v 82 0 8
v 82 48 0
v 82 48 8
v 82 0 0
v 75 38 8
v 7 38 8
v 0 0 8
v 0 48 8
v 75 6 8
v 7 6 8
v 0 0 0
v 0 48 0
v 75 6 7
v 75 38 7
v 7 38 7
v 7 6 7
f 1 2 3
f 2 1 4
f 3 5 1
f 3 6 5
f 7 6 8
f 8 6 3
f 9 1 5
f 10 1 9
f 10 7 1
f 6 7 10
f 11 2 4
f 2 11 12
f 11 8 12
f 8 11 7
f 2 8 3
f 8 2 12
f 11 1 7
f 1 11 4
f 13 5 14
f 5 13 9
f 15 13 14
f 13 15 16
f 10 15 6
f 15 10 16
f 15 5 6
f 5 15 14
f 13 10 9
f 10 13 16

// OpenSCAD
// Concept only. Provisional dimensions in mm.
$fn=32;
difference(){cube([82,48,8]);translate([7,6,7])cube([68,32,2]);}
